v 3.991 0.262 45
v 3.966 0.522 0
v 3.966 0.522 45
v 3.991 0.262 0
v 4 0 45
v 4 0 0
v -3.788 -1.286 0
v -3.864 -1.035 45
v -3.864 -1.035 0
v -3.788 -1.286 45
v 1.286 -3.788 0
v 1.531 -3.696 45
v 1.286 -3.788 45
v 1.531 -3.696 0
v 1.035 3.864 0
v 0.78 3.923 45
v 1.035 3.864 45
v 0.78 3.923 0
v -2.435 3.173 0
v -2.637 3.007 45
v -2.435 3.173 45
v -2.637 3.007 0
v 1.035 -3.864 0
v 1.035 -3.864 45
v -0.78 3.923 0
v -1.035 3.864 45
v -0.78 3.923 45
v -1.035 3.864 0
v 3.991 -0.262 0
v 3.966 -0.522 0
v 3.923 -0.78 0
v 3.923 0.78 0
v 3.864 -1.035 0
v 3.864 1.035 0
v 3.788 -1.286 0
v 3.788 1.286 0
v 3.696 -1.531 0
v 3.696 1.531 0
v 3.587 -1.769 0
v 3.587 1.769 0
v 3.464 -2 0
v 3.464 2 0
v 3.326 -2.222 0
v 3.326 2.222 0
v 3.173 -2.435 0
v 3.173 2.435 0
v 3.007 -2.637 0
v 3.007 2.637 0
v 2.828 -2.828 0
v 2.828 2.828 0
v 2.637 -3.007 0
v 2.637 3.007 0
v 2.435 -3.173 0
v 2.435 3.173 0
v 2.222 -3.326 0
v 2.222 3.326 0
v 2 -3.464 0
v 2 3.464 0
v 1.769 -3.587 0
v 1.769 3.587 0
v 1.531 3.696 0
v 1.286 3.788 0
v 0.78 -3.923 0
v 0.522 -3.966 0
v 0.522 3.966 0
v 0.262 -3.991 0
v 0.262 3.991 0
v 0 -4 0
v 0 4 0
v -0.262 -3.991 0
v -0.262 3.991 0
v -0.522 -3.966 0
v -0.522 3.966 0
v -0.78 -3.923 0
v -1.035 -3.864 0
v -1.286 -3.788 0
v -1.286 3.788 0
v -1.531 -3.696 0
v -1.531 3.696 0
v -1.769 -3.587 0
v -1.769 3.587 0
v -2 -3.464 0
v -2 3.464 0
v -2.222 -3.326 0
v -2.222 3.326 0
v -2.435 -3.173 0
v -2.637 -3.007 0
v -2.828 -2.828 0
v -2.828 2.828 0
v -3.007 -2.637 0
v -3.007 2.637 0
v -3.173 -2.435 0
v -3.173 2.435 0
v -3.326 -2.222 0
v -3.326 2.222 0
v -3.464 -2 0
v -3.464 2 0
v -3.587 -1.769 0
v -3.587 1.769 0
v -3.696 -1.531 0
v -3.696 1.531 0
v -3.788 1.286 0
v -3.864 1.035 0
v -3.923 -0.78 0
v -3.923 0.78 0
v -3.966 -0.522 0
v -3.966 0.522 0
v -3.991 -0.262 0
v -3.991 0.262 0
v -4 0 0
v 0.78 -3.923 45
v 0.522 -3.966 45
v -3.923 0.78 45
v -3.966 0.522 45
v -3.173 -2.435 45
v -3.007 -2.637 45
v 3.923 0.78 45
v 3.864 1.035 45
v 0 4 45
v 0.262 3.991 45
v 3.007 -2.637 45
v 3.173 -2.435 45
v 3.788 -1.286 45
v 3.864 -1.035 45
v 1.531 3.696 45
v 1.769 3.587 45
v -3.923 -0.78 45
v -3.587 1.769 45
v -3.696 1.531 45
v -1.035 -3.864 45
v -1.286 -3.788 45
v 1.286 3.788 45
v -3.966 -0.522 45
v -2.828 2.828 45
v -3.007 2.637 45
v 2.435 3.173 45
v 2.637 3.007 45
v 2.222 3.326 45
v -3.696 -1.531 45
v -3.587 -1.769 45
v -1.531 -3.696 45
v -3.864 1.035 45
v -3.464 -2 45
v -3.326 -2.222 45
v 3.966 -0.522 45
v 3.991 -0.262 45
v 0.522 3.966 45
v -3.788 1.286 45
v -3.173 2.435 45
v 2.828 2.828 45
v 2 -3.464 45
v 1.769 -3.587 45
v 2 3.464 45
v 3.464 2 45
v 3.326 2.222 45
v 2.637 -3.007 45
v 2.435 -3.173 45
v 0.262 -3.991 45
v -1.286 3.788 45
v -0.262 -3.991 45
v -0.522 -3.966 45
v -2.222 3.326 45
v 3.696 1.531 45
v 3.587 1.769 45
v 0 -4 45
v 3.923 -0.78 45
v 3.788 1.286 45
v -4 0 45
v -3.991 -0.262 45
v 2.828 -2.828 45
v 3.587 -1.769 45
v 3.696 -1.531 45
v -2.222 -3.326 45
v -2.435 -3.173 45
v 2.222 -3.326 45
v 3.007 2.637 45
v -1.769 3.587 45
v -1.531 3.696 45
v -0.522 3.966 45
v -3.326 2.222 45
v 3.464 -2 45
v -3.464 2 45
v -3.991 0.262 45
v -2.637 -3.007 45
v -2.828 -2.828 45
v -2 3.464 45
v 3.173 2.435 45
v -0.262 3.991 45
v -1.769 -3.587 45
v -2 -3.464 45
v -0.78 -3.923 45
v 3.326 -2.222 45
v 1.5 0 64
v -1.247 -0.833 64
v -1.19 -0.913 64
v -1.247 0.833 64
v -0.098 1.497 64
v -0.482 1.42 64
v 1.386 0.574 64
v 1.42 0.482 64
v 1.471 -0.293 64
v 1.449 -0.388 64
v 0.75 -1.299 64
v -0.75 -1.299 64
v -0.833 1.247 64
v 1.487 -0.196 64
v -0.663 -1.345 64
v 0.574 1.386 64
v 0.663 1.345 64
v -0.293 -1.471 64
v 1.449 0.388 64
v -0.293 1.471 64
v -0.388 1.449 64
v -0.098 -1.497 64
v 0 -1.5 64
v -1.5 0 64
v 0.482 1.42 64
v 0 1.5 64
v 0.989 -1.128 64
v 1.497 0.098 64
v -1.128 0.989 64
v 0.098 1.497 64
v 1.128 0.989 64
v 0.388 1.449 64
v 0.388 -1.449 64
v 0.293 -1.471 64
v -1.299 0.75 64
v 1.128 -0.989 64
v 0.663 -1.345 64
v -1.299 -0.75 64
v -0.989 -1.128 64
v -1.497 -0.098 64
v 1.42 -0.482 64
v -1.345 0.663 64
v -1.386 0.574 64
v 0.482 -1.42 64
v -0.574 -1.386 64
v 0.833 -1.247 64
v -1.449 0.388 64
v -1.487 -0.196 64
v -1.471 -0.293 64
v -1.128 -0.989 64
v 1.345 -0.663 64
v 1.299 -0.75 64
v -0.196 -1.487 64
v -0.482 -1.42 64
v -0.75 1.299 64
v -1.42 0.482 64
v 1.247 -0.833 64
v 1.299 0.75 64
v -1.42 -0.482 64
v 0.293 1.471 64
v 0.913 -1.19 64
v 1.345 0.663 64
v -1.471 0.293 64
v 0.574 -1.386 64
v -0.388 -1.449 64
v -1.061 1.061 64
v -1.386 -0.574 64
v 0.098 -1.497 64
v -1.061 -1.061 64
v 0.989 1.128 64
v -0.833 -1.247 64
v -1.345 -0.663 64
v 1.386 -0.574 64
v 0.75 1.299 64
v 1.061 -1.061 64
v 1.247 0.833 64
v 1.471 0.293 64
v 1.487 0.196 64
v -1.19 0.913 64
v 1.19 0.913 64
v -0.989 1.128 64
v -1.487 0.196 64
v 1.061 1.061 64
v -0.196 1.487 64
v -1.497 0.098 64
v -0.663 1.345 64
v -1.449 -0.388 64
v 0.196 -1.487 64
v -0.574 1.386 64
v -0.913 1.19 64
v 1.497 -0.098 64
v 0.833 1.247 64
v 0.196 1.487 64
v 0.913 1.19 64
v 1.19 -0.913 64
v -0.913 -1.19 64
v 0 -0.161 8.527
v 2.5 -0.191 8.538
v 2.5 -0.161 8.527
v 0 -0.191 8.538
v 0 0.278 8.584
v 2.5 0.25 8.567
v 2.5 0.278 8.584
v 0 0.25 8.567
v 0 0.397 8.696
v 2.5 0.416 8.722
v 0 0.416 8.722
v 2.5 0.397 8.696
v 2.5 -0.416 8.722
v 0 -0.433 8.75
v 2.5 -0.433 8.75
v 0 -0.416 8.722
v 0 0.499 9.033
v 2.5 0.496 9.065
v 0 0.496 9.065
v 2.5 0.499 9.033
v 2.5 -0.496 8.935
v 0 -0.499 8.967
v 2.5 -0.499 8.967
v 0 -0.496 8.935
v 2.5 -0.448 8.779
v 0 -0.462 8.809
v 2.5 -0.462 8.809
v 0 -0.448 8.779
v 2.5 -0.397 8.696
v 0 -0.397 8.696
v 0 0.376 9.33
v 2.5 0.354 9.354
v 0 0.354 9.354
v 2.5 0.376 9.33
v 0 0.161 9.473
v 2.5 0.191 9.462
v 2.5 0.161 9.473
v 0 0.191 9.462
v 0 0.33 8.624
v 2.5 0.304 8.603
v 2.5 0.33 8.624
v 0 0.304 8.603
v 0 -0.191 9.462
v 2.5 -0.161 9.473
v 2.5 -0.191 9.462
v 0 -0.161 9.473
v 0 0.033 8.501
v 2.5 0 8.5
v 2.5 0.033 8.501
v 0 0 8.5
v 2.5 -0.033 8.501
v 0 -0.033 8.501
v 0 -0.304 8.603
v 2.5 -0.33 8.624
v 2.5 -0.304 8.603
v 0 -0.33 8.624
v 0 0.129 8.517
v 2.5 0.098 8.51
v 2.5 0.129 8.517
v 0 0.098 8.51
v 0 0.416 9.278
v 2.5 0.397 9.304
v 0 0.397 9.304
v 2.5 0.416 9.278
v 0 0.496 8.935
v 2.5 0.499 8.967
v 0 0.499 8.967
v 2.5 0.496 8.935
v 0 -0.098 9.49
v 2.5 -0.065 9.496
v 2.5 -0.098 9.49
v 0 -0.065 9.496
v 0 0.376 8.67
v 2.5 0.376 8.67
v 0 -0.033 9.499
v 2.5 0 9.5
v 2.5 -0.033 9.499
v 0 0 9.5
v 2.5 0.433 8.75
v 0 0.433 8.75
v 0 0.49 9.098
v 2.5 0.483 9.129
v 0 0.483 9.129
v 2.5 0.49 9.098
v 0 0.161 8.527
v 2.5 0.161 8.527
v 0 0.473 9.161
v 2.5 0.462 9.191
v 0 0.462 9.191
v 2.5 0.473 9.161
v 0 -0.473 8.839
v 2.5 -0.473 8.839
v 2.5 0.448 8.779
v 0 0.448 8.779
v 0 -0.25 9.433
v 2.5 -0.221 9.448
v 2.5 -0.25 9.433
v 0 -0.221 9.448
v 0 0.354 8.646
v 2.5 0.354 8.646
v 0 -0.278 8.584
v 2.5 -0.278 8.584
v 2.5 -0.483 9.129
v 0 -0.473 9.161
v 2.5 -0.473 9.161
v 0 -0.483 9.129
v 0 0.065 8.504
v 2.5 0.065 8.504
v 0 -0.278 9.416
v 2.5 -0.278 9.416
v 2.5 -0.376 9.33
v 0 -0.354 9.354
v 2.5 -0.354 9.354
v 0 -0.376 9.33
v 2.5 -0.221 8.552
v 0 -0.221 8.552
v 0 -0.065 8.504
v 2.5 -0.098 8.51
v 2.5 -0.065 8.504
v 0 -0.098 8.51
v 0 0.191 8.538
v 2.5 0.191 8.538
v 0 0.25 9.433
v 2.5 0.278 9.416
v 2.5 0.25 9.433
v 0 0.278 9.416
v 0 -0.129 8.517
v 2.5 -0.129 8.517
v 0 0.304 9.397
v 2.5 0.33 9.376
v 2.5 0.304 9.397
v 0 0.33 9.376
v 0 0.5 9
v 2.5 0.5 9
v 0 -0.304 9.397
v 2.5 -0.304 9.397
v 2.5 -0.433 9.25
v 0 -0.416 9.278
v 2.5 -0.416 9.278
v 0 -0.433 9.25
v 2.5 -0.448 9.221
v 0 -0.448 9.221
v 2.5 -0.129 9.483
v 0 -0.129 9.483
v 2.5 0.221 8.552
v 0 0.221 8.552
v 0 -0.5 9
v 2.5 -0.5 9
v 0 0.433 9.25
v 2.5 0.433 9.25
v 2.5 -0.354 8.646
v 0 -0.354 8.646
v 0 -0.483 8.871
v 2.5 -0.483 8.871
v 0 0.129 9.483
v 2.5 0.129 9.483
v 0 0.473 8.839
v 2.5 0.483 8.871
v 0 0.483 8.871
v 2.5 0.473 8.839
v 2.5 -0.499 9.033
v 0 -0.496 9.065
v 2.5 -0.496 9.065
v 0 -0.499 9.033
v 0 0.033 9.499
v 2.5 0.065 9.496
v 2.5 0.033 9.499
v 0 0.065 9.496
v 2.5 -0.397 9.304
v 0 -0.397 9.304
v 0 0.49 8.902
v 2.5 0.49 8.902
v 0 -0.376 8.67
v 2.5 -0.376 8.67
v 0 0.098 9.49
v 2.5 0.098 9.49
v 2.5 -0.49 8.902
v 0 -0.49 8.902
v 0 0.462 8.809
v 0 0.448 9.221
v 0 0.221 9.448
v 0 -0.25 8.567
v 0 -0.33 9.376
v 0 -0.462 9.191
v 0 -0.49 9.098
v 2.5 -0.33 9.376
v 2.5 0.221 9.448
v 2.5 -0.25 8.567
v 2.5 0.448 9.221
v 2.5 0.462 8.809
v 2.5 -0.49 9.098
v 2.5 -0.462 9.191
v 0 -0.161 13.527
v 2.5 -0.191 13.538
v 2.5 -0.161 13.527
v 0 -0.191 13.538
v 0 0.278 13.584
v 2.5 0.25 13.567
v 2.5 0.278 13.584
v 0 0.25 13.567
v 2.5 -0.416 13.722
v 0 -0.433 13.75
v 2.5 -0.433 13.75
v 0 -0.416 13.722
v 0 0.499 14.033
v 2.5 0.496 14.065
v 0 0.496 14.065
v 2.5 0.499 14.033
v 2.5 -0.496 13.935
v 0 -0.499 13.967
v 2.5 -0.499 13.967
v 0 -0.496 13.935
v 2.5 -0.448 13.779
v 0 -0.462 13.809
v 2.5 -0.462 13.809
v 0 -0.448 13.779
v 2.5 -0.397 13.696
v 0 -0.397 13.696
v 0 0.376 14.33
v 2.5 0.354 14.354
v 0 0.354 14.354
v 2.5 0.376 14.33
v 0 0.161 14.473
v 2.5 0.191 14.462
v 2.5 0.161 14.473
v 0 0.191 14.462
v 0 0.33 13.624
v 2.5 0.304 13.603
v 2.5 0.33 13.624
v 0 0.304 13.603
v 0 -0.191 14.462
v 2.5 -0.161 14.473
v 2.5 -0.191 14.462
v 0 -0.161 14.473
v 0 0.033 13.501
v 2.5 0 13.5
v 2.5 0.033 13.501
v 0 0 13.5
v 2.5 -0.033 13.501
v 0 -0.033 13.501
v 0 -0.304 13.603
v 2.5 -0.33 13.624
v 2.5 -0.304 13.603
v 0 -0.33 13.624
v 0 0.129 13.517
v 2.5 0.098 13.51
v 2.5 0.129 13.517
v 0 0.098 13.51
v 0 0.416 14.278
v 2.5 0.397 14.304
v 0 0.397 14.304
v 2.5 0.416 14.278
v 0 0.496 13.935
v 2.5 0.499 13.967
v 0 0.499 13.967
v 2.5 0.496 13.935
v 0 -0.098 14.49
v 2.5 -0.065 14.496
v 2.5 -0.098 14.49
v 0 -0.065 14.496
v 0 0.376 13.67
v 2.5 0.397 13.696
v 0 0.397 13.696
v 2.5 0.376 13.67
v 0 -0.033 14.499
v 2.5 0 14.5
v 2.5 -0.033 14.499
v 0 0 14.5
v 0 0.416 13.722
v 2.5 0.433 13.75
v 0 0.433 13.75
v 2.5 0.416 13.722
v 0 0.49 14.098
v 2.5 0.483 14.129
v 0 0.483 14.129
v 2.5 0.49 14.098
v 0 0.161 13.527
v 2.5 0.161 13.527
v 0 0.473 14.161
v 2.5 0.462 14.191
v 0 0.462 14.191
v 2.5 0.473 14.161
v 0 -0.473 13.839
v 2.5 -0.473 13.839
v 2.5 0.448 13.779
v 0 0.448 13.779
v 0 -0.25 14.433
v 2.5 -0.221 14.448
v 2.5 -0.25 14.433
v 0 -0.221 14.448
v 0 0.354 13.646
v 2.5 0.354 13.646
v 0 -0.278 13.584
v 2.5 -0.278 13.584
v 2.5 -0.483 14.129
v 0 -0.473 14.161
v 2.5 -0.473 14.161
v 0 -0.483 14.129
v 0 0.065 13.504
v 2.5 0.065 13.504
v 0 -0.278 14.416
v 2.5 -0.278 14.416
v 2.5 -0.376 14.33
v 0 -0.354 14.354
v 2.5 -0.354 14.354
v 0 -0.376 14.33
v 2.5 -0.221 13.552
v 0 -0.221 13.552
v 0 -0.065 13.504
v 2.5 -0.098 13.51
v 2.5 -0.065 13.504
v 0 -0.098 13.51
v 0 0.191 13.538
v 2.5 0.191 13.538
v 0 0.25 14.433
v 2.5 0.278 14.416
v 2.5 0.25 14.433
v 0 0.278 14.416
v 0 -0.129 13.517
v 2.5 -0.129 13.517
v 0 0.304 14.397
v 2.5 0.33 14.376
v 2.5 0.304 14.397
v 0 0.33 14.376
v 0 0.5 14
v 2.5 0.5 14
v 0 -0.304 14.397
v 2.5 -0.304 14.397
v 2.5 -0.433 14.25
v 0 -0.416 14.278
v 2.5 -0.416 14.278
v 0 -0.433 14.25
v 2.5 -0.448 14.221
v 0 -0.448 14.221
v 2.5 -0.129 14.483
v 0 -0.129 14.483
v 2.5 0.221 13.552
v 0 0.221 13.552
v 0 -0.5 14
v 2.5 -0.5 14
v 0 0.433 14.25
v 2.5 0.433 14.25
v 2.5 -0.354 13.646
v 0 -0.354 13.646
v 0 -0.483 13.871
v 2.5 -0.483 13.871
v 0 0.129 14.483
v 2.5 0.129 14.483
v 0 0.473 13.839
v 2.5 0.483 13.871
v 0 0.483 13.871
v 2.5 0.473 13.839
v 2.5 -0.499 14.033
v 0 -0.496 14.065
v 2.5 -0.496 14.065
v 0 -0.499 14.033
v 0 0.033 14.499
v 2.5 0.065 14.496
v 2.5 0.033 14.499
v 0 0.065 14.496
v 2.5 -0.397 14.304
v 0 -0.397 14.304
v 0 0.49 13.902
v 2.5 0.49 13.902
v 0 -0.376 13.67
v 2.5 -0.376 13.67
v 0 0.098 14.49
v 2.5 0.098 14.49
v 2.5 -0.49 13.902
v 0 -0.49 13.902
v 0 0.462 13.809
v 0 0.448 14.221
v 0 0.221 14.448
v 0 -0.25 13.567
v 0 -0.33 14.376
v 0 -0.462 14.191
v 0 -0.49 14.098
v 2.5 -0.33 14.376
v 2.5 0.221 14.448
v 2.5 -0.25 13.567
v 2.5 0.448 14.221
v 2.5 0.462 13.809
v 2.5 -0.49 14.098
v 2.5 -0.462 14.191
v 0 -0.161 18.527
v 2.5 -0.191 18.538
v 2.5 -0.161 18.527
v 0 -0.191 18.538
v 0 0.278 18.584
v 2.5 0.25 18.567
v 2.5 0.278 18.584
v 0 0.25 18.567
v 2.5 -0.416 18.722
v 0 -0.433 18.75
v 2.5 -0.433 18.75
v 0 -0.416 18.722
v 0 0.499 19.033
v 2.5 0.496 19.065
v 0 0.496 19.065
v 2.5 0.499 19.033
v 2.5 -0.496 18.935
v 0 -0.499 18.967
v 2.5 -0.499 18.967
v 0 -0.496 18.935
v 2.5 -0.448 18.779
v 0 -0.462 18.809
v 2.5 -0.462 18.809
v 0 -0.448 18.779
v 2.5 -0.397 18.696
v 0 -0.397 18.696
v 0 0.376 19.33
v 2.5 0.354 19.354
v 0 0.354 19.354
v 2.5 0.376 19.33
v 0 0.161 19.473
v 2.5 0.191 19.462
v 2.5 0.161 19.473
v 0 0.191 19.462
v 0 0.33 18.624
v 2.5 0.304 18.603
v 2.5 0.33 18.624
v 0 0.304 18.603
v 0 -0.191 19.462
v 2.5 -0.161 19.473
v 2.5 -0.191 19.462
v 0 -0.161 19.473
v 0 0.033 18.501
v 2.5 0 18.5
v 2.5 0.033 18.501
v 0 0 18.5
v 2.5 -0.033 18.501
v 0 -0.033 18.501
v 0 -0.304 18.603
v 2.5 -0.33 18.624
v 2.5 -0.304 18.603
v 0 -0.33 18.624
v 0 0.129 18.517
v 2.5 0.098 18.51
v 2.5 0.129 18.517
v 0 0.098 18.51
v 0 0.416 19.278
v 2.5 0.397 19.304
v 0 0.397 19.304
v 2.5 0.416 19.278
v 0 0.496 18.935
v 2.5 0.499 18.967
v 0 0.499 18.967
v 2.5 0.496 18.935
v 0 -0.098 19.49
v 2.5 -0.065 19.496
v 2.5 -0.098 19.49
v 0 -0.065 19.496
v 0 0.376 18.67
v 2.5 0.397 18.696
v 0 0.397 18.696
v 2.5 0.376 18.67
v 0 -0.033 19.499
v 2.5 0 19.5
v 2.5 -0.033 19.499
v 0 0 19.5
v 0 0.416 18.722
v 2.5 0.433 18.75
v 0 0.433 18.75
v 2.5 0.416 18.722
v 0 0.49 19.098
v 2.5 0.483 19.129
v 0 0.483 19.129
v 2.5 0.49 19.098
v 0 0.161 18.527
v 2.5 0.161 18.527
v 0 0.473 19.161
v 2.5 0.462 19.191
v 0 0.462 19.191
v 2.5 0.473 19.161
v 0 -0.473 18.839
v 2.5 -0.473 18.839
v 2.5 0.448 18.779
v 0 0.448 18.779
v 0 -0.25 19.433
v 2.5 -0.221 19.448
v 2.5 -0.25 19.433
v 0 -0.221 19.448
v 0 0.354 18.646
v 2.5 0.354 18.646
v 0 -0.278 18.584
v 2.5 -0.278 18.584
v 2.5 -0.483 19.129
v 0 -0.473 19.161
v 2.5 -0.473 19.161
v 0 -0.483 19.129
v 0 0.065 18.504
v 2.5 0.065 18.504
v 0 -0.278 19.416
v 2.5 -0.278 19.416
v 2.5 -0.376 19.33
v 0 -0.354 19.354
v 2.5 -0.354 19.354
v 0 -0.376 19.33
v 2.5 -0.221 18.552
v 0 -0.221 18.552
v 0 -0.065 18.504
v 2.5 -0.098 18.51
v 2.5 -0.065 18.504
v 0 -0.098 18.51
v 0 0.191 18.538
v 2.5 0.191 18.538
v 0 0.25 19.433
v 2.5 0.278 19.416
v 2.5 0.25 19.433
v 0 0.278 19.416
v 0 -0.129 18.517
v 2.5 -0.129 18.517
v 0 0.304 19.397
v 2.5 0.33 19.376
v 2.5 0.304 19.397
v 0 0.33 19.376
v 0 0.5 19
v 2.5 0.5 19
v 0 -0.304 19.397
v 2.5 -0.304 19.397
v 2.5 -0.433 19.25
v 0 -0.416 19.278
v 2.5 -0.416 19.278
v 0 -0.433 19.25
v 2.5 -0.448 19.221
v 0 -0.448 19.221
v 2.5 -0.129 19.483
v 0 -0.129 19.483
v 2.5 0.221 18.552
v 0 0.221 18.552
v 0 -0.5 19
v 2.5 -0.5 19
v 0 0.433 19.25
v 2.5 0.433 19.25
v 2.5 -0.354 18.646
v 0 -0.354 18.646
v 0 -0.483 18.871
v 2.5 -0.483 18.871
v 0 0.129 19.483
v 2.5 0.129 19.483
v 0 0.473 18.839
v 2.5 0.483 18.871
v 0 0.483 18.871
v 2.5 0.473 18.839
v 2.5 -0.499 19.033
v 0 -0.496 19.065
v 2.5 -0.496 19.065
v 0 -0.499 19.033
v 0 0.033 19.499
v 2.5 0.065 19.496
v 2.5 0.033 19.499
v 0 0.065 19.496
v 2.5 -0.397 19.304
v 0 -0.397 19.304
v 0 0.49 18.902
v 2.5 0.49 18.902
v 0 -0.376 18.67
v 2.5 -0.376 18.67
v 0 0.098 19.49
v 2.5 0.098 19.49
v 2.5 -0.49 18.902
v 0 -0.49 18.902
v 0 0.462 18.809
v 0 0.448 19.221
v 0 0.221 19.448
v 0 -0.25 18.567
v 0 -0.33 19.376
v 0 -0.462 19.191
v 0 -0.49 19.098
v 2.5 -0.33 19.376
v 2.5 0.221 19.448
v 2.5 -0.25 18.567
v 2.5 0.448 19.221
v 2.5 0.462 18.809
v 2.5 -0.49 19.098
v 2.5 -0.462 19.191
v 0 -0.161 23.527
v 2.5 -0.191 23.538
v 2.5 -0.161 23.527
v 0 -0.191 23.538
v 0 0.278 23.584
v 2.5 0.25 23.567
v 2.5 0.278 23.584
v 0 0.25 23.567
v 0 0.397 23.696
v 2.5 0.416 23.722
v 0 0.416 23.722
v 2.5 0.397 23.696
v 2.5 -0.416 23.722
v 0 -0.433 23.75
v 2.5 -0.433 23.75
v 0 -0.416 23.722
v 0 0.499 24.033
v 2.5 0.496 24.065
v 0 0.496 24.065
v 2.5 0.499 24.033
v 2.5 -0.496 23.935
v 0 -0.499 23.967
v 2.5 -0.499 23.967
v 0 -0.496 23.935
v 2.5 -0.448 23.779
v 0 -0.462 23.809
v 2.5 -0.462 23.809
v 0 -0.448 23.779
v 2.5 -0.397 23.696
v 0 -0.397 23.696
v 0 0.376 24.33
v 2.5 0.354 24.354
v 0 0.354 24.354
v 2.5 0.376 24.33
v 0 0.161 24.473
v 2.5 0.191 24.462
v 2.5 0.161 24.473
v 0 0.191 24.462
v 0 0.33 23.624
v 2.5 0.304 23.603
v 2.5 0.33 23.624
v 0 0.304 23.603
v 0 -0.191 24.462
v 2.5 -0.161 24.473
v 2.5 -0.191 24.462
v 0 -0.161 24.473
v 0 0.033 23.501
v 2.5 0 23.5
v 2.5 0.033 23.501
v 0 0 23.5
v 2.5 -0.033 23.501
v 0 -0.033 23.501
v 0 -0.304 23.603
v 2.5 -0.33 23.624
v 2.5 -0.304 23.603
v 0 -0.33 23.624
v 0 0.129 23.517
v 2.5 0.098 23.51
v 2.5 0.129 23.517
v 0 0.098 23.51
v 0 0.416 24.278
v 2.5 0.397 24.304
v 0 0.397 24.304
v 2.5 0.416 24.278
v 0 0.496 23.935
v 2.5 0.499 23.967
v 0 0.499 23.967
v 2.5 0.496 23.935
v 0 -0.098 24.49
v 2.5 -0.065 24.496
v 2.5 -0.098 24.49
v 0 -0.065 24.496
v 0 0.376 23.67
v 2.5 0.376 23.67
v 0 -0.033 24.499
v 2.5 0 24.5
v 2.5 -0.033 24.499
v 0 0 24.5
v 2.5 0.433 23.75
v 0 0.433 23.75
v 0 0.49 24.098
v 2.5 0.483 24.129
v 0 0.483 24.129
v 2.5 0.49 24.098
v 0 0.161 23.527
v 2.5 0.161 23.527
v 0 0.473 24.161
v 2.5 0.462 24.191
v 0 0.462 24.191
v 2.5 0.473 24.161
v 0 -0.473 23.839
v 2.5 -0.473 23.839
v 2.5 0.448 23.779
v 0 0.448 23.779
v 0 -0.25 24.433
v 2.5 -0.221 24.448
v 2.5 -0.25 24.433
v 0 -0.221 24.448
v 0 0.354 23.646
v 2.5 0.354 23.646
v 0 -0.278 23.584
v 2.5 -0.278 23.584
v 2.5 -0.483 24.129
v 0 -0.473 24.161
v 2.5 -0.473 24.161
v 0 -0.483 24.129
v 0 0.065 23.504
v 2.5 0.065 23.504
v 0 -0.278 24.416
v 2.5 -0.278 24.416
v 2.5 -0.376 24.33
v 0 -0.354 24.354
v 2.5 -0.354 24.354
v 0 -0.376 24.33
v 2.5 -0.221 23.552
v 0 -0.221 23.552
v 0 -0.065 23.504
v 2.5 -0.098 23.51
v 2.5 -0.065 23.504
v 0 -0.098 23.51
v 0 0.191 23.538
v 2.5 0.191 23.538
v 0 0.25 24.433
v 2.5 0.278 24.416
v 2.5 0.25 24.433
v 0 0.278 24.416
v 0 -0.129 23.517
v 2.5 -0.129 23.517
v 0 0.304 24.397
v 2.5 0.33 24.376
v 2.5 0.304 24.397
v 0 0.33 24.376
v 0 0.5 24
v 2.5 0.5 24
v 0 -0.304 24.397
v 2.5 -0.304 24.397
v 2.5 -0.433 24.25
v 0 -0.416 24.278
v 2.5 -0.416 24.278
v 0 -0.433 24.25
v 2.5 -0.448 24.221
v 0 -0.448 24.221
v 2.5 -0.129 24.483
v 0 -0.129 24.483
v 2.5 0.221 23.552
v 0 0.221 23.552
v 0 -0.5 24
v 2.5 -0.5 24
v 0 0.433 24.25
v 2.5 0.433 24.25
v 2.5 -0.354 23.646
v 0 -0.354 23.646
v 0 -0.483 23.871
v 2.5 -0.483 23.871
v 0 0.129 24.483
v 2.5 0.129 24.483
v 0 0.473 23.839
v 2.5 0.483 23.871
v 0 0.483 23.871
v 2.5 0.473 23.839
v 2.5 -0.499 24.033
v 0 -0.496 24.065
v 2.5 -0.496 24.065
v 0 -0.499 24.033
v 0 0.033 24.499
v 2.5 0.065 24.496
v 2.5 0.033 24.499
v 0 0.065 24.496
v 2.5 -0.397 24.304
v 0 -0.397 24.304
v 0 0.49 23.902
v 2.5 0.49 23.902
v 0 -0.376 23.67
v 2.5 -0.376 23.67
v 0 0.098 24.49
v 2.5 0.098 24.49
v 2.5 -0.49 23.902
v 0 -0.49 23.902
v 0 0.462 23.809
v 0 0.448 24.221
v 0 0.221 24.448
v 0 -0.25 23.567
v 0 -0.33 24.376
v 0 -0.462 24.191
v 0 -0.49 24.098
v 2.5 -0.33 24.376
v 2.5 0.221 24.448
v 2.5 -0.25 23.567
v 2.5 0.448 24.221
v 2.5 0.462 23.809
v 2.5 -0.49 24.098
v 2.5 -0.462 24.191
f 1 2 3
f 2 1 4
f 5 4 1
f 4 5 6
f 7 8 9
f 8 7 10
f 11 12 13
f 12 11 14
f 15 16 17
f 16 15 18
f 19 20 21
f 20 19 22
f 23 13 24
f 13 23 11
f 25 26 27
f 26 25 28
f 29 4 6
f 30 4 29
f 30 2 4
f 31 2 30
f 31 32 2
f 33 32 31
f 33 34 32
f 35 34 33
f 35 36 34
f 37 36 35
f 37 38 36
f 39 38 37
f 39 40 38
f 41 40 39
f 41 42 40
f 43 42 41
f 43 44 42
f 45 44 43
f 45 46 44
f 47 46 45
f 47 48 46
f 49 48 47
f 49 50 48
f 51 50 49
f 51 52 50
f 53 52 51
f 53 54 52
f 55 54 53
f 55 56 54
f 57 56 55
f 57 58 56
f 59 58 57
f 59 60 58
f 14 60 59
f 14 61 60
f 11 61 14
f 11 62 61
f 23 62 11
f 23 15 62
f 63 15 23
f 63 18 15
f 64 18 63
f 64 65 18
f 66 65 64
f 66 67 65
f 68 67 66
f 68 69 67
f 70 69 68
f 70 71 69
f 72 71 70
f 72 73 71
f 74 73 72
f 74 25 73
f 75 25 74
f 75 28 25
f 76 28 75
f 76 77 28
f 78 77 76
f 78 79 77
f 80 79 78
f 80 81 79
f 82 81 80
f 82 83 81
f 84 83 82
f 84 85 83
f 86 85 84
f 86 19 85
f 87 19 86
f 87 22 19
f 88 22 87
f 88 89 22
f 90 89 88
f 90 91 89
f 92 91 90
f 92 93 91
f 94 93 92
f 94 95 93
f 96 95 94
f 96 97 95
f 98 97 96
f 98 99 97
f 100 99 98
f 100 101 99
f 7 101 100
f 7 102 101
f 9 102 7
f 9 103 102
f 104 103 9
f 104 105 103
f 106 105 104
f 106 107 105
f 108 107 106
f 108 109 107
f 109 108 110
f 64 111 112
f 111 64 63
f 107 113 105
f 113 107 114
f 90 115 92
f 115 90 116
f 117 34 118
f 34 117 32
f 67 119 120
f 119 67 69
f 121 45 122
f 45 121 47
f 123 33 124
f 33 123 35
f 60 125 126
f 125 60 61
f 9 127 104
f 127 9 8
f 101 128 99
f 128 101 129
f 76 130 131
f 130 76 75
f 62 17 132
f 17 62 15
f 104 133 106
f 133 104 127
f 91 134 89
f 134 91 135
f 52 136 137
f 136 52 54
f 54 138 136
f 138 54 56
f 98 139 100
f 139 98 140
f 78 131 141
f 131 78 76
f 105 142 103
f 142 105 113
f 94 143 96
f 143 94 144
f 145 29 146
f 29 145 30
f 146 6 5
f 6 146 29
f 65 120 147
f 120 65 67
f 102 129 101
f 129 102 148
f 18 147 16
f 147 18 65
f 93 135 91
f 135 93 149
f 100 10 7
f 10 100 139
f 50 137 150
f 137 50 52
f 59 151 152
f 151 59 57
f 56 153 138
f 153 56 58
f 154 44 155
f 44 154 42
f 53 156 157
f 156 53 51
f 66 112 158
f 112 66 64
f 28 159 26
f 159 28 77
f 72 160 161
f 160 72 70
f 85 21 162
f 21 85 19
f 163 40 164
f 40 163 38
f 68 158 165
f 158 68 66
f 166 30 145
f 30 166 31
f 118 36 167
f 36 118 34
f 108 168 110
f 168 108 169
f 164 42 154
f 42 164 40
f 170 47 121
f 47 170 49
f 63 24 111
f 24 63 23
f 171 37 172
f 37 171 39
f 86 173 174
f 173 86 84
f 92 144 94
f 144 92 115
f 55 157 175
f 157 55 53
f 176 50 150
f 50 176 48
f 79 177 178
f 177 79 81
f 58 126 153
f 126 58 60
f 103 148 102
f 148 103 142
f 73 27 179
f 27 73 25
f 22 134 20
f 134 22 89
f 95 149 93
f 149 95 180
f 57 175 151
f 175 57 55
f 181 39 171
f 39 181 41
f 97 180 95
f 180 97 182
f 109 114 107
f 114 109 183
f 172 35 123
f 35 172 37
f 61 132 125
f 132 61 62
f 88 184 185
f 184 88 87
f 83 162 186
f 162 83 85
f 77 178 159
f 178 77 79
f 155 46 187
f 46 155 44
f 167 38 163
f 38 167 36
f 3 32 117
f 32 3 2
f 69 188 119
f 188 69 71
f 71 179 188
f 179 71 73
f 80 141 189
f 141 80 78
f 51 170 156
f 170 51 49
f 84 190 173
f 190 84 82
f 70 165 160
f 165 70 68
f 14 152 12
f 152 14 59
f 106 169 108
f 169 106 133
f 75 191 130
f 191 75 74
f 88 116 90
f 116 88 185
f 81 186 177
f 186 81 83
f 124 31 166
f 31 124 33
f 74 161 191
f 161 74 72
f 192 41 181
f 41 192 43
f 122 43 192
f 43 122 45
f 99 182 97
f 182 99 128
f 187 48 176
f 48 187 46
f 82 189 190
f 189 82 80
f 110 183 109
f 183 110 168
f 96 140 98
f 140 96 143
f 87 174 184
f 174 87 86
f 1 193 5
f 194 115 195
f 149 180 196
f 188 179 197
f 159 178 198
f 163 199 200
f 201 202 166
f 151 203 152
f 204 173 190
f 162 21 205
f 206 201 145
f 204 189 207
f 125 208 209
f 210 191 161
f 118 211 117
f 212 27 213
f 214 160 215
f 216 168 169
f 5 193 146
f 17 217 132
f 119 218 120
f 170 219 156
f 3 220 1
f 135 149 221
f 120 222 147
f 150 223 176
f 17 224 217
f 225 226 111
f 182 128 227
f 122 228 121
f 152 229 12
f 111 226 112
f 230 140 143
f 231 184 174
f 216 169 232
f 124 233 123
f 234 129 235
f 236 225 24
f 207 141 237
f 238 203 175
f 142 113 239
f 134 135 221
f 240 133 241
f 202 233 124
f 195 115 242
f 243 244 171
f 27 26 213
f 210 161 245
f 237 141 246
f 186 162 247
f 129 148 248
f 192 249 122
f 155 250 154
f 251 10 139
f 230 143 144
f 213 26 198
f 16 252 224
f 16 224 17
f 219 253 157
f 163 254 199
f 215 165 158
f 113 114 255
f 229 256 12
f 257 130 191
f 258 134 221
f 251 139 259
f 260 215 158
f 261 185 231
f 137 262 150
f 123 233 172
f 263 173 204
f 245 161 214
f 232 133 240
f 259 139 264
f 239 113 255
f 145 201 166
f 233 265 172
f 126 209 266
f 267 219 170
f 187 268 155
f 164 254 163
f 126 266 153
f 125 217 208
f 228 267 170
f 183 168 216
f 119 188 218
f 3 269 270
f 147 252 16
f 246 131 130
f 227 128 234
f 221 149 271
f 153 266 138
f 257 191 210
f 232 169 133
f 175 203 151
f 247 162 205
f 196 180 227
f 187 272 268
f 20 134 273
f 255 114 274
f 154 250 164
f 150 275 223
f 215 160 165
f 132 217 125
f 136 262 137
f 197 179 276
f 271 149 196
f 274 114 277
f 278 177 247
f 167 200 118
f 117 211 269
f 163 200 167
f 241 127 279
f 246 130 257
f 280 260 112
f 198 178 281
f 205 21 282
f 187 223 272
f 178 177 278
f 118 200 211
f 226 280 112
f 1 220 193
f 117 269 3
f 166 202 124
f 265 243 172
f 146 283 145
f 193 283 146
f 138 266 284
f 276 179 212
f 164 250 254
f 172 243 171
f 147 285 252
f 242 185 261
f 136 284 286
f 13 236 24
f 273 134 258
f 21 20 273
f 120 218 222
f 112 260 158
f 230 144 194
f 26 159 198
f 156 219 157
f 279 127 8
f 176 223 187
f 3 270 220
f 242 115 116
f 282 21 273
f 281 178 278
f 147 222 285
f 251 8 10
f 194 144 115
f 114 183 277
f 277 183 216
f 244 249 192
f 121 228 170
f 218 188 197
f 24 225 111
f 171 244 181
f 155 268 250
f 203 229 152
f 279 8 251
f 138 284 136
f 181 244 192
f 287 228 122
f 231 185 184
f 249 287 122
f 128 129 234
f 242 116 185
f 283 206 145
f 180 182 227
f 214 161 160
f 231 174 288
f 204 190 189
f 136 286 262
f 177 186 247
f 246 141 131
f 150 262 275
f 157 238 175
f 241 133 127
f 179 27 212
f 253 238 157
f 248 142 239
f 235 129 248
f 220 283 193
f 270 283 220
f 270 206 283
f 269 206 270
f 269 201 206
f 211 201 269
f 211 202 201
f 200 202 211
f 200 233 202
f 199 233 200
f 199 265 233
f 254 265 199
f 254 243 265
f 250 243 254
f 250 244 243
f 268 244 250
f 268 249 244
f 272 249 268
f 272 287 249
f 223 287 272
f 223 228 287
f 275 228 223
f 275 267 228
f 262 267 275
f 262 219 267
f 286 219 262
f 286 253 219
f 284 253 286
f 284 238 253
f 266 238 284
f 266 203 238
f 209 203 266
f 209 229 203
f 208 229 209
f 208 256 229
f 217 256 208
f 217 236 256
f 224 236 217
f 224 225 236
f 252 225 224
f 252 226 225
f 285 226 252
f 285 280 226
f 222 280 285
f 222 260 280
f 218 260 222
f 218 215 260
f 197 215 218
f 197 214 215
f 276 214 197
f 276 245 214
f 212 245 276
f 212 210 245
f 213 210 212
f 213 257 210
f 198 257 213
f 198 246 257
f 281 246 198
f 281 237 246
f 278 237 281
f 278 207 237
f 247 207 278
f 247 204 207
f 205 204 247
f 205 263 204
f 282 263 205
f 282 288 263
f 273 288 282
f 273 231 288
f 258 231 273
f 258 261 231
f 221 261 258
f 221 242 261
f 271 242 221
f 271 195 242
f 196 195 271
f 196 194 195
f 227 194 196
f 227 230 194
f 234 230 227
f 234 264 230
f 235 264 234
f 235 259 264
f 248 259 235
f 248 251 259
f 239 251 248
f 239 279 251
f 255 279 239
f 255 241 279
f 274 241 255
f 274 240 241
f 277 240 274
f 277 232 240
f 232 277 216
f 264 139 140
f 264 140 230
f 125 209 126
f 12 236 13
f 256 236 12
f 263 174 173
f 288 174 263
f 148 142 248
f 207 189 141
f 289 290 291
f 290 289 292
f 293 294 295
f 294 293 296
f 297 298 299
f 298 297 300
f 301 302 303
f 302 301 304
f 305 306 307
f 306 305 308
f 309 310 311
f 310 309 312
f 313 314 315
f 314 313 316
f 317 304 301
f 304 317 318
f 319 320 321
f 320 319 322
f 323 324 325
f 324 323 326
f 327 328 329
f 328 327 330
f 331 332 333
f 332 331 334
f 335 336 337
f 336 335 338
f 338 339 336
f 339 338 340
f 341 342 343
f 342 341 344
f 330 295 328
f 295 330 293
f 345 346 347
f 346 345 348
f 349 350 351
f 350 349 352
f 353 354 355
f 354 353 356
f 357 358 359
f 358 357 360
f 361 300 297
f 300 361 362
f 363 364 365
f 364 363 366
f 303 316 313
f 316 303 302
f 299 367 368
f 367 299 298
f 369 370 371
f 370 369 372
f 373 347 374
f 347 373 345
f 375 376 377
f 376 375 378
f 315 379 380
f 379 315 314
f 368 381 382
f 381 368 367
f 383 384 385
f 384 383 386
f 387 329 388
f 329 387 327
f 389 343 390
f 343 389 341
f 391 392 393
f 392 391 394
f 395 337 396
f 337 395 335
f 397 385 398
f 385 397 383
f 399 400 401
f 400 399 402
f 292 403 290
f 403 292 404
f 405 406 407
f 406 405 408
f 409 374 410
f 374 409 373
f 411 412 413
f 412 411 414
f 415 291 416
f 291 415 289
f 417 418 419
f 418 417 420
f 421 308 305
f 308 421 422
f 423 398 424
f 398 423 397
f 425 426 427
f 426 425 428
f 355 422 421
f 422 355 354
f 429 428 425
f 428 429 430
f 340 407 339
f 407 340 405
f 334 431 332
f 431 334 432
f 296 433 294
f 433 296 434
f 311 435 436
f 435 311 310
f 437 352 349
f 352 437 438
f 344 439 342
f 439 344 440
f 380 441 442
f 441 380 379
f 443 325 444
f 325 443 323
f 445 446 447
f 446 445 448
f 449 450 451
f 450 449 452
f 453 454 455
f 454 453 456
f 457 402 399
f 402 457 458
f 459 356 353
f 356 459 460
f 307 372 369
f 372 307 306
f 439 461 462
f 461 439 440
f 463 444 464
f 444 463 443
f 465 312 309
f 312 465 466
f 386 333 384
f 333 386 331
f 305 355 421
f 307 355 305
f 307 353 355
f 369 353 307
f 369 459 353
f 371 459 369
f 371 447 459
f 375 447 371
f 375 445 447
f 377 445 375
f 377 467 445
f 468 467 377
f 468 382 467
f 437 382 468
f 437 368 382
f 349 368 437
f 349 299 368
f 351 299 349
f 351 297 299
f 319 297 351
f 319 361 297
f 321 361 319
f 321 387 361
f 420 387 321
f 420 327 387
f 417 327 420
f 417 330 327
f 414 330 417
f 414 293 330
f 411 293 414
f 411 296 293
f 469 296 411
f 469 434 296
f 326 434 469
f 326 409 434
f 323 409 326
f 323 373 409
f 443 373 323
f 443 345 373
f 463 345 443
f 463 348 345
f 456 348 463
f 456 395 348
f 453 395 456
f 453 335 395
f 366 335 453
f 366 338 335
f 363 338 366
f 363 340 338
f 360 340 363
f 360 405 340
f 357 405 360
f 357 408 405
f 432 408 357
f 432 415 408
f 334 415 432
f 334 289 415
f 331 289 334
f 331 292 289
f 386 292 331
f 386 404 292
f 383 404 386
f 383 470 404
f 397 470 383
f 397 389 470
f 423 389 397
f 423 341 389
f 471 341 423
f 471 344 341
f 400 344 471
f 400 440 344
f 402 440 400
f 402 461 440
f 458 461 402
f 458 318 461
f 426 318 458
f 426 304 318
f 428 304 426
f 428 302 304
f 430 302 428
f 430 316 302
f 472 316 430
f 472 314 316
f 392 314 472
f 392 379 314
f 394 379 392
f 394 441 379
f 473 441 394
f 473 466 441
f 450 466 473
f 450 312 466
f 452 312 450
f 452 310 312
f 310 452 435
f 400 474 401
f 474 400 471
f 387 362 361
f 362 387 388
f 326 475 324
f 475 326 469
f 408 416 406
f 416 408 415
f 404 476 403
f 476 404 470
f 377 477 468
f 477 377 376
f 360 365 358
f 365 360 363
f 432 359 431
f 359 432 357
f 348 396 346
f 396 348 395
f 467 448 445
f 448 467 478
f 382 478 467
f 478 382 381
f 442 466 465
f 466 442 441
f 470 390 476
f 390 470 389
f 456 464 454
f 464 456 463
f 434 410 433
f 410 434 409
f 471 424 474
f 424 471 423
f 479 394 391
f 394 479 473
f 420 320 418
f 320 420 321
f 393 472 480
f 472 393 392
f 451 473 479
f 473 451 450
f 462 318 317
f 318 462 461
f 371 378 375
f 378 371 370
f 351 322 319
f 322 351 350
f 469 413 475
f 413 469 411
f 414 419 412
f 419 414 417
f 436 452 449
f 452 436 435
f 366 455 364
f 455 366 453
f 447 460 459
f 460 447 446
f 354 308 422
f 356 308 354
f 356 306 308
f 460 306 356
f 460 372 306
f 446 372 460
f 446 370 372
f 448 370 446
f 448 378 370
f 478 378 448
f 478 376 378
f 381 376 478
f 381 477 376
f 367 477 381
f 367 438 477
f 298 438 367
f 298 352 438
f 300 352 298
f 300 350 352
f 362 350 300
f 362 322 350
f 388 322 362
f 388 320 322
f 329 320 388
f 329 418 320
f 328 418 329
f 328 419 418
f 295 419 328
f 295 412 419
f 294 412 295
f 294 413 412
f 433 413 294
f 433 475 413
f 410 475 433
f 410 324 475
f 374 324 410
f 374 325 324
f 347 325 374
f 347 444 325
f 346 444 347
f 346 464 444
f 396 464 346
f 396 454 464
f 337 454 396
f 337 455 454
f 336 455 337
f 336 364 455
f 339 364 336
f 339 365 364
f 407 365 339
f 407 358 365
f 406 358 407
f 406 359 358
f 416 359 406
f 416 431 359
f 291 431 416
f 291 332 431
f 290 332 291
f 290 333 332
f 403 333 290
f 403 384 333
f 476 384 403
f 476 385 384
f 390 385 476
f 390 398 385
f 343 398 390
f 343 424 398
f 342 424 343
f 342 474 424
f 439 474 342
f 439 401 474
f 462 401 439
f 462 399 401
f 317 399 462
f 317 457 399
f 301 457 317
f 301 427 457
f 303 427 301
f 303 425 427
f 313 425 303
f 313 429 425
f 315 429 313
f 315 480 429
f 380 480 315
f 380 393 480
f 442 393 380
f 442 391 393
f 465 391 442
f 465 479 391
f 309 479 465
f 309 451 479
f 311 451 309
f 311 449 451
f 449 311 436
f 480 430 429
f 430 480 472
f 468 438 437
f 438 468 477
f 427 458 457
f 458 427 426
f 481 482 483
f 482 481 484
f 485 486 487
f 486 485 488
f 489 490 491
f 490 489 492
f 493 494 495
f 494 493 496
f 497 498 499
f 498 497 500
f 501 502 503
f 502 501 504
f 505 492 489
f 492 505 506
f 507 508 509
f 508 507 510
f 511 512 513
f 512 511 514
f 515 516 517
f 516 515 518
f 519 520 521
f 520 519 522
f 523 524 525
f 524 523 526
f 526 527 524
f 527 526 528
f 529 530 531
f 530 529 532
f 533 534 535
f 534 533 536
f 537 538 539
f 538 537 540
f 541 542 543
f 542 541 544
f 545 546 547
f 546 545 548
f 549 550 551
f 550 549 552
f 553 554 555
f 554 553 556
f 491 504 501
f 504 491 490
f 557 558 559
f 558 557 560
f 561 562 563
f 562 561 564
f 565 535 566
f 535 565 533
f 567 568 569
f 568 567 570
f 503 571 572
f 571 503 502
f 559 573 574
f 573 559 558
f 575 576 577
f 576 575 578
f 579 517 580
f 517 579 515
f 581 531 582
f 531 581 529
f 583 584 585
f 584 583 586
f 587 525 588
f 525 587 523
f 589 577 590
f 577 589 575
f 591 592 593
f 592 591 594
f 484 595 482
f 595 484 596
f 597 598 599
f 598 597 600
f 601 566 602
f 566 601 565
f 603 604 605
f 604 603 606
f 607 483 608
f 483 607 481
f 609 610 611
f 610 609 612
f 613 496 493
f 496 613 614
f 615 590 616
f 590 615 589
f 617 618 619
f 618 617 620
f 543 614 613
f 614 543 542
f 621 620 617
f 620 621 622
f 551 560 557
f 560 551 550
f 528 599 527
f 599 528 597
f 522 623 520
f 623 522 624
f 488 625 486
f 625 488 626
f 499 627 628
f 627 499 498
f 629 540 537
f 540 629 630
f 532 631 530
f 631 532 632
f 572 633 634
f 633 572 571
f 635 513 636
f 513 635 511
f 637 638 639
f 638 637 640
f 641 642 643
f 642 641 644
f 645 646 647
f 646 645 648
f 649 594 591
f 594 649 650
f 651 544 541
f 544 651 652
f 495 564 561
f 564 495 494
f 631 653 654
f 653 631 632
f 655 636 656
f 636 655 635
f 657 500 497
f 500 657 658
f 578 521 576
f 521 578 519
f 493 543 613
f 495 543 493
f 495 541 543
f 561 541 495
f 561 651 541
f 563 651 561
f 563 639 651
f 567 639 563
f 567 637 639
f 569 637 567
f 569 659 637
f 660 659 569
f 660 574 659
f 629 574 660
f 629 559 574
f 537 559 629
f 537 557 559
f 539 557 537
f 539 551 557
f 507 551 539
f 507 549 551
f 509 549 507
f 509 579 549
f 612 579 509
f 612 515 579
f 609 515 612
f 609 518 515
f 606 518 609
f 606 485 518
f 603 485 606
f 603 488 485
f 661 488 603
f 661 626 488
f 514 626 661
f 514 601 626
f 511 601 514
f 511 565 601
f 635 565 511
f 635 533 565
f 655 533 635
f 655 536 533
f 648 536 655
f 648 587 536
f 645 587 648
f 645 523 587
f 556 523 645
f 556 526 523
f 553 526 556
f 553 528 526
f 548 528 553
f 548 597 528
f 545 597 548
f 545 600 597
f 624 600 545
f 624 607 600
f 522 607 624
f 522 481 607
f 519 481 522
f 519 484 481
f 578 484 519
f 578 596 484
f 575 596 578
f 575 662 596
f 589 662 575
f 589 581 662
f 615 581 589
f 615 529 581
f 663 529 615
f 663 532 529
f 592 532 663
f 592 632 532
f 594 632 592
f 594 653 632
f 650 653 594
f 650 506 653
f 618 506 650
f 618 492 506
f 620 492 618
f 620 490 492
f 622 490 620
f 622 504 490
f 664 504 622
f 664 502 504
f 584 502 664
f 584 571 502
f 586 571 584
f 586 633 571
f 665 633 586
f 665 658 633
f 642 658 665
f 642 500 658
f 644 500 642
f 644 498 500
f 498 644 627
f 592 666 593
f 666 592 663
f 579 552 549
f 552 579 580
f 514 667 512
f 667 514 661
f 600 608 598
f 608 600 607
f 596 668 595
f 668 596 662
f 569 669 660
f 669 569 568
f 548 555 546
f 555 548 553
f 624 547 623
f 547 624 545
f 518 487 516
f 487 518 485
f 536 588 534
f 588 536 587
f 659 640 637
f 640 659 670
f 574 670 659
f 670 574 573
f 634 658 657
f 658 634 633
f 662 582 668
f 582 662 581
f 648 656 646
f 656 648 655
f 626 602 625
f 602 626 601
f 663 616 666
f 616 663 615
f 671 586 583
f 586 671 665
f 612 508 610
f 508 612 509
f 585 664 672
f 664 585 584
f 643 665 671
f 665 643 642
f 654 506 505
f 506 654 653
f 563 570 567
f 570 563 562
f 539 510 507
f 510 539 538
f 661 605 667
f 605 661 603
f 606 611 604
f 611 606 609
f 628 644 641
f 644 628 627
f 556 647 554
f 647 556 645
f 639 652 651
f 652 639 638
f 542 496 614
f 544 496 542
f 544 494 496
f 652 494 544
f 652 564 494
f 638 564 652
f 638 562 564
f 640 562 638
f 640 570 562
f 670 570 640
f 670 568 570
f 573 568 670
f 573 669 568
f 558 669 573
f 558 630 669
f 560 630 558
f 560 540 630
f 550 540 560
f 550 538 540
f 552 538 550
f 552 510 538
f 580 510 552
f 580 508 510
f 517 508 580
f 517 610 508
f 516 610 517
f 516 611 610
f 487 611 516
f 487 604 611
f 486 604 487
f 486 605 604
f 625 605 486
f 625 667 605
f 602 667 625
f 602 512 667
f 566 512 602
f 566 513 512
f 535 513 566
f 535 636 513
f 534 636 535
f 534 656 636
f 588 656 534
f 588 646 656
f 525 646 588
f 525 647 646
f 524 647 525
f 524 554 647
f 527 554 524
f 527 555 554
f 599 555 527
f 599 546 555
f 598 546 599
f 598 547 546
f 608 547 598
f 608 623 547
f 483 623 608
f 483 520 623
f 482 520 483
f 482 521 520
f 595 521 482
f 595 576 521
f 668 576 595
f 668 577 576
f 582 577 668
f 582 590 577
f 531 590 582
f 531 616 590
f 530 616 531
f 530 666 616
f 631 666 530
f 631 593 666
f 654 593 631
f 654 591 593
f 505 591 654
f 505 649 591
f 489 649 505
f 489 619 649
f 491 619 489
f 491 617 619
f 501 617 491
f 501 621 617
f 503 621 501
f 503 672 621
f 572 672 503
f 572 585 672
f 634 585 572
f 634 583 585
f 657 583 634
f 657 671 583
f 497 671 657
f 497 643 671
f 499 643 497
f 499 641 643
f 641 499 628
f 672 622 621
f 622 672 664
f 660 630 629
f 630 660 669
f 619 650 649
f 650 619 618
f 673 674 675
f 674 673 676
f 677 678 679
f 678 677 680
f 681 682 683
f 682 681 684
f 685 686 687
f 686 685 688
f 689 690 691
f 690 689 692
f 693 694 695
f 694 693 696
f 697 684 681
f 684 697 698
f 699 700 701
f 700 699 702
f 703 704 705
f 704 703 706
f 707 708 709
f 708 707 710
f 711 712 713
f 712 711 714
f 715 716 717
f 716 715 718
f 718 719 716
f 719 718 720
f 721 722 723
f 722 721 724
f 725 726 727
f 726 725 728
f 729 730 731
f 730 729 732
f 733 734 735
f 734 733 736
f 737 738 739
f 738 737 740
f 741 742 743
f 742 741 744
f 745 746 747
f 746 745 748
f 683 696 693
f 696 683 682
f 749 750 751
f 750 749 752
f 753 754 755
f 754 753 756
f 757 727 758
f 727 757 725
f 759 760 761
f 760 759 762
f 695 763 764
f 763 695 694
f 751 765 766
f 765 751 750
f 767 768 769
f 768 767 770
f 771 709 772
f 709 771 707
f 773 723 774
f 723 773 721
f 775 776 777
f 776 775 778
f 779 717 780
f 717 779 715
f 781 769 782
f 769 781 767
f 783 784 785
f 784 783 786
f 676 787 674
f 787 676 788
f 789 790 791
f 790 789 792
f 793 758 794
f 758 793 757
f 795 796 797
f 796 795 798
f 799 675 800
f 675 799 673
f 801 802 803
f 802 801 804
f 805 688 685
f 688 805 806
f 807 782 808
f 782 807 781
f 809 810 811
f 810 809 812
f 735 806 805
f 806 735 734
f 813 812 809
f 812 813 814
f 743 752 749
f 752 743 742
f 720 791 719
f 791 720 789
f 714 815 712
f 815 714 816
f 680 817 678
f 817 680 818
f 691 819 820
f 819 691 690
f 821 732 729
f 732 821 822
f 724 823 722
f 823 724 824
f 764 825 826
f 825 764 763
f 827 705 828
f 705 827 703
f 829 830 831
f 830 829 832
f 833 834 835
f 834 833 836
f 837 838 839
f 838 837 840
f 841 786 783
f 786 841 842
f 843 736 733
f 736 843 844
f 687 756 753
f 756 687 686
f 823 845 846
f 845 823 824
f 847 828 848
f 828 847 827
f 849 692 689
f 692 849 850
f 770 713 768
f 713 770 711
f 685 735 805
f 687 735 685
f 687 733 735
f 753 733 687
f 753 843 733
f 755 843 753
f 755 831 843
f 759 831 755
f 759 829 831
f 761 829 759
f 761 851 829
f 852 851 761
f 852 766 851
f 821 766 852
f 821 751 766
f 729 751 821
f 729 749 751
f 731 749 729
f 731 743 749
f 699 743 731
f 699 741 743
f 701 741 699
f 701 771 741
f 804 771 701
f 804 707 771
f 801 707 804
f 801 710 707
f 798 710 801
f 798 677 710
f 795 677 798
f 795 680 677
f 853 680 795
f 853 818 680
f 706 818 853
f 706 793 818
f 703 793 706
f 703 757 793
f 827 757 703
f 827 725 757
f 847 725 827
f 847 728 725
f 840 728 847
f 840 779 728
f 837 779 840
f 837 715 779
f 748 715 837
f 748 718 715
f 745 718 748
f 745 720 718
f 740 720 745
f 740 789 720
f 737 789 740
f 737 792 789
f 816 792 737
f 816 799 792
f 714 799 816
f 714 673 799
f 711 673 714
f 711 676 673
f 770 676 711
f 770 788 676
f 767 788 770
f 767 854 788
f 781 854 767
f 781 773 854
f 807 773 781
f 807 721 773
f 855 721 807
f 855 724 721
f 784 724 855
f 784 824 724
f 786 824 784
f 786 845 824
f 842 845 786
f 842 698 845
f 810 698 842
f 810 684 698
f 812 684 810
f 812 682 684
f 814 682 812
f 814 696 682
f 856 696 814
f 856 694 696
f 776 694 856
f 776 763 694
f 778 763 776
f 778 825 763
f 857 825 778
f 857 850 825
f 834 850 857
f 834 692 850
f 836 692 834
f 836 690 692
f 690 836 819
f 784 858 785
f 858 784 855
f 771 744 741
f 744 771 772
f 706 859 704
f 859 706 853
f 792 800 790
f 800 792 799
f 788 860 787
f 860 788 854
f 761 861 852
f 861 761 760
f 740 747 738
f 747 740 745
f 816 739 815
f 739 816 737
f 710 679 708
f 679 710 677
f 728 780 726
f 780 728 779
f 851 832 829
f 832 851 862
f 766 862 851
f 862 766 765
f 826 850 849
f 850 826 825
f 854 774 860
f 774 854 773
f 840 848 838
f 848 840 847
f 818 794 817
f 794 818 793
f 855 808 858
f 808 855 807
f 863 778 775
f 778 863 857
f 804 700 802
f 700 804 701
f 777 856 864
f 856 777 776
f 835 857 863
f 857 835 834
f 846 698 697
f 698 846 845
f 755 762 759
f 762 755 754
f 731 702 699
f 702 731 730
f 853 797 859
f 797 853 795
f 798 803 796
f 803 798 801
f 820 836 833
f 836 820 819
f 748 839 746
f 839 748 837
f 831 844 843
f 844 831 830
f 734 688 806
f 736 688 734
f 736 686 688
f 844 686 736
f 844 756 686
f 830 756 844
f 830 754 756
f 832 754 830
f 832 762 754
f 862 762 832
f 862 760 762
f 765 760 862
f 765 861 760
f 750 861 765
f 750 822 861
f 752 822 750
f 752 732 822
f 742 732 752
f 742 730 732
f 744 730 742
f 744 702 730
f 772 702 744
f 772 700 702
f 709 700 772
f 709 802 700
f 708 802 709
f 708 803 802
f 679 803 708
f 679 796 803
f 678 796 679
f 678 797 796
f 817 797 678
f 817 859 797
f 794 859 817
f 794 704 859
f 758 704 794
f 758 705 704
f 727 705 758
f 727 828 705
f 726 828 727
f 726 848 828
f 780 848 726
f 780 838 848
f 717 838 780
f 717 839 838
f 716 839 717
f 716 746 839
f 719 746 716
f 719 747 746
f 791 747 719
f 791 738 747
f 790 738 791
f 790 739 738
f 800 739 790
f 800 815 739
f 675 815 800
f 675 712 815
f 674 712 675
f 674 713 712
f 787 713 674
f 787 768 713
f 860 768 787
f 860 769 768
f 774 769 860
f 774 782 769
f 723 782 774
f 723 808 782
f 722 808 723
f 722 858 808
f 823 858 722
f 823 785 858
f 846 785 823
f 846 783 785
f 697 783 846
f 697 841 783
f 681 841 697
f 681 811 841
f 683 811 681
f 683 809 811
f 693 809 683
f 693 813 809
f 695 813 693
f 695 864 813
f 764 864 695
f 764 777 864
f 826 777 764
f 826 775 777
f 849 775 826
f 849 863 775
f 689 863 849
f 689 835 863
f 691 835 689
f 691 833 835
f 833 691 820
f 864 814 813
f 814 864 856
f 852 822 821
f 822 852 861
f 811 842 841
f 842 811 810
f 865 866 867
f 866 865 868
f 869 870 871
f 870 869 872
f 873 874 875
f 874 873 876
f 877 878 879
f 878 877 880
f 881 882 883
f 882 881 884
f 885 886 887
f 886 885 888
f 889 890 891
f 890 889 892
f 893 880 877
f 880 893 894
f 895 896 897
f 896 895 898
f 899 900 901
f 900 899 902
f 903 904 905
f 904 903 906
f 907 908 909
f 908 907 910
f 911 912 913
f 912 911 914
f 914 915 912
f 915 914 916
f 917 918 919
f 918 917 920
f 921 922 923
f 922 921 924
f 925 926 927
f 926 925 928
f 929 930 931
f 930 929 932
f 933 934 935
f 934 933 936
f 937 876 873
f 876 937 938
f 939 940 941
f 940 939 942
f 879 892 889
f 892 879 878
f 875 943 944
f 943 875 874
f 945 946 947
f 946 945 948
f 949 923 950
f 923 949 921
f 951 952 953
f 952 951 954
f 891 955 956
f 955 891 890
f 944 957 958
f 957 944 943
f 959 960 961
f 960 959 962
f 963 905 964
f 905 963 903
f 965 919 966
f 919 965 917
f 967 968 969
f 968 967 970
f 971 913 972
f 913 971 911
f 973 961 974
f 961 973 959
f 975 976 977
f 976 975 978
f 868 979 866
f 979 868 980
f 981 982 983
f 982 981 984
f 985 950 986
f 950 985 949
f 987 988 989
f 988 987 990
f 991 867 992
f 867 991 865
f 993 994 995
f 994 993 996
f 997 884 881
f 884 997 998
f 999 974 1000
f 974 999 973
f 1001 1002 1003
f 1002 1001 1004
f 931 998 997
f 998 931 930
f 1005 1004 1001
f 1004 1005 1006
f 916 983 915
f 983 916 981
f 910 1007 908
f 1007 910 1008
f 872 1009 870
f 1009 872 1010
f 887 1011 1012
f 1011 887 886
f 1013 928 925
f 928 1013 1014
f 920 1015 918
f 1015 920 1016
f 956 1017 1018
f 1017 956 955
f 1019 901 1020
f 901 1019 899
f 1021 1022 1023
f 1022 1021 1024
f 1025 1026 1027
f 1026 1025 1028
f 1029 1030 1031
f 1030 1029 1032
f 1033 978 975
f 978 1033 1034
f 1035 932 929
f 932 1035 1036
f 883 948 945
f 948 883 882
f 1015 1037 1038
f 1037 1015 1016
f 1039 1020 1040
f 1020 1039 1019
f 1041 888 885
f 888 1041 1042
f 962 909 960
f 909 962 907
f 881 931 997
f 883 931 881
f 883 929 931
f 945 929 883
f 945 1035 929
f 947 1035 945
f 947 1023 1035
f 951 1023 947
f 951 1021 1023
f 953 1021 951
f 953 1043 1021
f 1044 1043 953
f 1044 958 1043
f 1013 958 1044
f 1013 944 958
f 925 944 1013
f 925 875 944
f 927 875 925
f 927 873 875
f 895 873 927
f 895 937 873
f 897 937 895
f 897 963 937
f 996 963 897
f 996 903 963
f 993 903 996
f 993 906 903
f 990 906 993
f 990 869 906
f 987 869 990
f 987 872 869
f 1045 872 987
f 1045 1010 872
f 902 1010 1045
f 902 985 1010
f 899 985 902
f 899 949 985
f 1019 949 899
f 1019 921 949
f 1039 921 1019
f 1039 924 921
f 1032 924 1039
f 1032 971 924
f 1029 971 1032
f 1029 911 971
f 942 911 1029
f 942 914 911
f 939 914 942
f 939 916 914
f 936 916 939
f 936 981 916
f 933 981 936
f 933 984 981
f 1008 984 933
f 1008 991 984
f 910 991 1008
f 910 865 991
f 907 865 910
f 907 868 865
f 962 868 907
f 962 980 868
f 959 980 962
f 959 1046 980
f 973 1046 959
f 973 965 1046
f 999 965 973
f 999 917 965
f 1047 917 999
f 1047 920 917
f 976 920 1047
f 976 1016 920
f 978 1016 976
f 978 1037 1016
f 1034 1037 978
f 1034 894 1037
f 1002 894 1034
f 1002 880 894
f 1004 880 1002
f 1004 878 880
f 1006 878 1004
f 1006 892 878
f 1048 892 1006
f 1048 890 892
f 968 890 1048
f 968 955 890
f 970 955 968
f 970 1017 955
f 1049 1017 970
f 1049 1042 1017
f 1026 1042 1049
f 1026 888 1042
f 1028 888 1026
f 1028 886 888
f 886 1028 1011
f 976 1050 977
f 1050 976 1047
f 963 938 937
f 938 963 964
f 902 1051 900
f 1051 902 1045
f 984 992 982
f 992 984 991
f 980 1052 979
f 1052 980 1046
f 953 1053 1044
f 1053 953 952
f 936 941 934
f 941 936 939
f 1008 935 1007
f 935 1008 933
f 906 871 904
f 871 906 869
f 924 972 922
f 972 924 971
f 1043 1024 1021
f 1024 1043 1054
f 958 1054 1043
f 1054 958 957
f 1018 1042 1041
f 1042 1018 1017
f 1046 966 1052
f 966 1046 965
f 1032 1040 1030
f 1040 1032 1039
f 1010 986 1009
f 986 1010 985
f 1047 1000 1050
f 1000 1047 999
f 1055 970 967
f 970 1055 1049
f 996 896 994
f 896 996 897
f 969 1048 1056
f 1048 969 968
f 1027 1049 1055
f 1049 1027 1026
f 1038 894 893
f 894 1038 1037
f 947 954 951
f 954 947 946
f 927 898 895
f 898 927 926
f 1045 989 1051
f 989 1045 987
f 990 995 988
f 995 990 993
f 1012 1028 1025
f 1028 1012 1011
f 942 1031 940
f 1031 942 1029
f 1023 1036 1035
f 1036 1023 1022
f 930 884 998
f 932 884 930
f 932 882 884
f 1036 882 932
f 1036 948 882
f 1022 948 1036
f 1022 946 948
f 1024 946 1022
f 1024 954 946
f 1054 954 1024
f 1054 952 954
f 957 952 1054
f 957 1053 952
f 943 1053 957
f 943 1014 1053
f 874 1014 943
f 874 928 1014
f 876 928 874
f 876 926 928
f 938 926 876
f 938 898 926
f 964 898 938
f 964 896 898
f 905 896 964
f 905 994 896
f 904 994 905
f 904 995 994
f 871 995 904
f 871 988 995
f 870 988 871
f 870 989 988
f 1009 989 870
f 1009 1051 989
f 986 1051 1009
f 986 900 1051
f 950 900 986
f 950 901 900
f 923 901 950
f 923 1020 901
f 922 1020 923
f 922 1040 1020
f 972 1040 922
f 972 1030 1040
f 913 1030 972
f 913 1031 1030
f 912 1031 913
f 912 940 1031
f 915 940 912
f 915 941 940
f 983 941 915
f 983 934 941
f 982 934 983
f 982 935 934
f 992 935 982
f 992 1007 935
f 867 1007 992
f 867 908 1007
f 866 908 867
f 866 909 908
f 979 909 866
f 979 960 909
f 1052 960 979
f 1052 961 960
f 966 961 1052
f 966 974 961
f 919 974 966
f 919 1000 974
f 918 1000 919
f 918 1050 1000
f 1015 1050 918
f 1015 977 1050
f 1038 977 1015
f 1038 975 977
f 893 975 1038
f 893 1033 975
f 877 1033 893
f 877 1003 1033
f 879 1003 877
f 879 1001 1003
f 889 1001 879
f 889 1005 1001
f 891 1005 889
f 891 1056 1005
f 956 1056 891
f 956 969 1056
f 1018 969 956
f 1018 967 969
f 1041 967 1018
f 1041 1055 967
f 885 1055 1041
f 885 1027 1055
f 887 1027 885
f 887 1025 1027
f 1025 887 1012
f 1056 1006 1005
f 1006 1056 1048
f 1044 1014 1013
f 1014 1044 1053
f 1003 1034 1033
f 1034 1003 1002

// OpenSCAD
// Tissue-grinding pestle for a 1.5 mL microcentrifuge tube
// Print orientation: standing upright on the XY plane, building up +Z

// ---------------- Parameters ----------------
handle_d      = 8;    // handle diameter (z = 0 .. 45)
handle_h      = 45;   // handle height
cone_d_top    = 8;    // cone diameter at its base (z = 45)
cone_d_bot    = 3;    // cone diameter at its tip (z = 62)
cone_h        = 19;   // cone height (z = 45 to z = 62)
tip_r         = 1.5;  // tip sphere radius (centre at z = 62)
groove_count  = 4;    // number of circumferential grooves
groove_w      = 2;    // groove width along Z
groove_d      = 1;    // groove depth from surface
groove_z      = [10, 15, 20, 25]; // groove centre heights
eps           = 0.5;  // overshoot for clean boolean cuts

$fn = 96;

// ---------------- Model ----------------
difference() {
    union() {
        // Handle
        cylinder(d = handle_d, h = handle_h);
        // Tapered cone (45deg walls: radius drops by 1mm per 1mm height)
        translate([0, 0, handle_h])
            cylinder(d1 = cone_d_top, d2 = cone_d_bot, h = cone_h);
        // Rounded tip: sphere centred at z = 62
        translate([0, 0, 62 - tip_r])
            sphere(r = tip_r);
    }

    // Grip grooves, cut fully through the handle
    for (z = groove_z)
        translate([0, 0, z - groove_w / 2])
            rotate([0, 90, 0])
                cylinder(d = groove_d, h = groove_w + eps);
}
